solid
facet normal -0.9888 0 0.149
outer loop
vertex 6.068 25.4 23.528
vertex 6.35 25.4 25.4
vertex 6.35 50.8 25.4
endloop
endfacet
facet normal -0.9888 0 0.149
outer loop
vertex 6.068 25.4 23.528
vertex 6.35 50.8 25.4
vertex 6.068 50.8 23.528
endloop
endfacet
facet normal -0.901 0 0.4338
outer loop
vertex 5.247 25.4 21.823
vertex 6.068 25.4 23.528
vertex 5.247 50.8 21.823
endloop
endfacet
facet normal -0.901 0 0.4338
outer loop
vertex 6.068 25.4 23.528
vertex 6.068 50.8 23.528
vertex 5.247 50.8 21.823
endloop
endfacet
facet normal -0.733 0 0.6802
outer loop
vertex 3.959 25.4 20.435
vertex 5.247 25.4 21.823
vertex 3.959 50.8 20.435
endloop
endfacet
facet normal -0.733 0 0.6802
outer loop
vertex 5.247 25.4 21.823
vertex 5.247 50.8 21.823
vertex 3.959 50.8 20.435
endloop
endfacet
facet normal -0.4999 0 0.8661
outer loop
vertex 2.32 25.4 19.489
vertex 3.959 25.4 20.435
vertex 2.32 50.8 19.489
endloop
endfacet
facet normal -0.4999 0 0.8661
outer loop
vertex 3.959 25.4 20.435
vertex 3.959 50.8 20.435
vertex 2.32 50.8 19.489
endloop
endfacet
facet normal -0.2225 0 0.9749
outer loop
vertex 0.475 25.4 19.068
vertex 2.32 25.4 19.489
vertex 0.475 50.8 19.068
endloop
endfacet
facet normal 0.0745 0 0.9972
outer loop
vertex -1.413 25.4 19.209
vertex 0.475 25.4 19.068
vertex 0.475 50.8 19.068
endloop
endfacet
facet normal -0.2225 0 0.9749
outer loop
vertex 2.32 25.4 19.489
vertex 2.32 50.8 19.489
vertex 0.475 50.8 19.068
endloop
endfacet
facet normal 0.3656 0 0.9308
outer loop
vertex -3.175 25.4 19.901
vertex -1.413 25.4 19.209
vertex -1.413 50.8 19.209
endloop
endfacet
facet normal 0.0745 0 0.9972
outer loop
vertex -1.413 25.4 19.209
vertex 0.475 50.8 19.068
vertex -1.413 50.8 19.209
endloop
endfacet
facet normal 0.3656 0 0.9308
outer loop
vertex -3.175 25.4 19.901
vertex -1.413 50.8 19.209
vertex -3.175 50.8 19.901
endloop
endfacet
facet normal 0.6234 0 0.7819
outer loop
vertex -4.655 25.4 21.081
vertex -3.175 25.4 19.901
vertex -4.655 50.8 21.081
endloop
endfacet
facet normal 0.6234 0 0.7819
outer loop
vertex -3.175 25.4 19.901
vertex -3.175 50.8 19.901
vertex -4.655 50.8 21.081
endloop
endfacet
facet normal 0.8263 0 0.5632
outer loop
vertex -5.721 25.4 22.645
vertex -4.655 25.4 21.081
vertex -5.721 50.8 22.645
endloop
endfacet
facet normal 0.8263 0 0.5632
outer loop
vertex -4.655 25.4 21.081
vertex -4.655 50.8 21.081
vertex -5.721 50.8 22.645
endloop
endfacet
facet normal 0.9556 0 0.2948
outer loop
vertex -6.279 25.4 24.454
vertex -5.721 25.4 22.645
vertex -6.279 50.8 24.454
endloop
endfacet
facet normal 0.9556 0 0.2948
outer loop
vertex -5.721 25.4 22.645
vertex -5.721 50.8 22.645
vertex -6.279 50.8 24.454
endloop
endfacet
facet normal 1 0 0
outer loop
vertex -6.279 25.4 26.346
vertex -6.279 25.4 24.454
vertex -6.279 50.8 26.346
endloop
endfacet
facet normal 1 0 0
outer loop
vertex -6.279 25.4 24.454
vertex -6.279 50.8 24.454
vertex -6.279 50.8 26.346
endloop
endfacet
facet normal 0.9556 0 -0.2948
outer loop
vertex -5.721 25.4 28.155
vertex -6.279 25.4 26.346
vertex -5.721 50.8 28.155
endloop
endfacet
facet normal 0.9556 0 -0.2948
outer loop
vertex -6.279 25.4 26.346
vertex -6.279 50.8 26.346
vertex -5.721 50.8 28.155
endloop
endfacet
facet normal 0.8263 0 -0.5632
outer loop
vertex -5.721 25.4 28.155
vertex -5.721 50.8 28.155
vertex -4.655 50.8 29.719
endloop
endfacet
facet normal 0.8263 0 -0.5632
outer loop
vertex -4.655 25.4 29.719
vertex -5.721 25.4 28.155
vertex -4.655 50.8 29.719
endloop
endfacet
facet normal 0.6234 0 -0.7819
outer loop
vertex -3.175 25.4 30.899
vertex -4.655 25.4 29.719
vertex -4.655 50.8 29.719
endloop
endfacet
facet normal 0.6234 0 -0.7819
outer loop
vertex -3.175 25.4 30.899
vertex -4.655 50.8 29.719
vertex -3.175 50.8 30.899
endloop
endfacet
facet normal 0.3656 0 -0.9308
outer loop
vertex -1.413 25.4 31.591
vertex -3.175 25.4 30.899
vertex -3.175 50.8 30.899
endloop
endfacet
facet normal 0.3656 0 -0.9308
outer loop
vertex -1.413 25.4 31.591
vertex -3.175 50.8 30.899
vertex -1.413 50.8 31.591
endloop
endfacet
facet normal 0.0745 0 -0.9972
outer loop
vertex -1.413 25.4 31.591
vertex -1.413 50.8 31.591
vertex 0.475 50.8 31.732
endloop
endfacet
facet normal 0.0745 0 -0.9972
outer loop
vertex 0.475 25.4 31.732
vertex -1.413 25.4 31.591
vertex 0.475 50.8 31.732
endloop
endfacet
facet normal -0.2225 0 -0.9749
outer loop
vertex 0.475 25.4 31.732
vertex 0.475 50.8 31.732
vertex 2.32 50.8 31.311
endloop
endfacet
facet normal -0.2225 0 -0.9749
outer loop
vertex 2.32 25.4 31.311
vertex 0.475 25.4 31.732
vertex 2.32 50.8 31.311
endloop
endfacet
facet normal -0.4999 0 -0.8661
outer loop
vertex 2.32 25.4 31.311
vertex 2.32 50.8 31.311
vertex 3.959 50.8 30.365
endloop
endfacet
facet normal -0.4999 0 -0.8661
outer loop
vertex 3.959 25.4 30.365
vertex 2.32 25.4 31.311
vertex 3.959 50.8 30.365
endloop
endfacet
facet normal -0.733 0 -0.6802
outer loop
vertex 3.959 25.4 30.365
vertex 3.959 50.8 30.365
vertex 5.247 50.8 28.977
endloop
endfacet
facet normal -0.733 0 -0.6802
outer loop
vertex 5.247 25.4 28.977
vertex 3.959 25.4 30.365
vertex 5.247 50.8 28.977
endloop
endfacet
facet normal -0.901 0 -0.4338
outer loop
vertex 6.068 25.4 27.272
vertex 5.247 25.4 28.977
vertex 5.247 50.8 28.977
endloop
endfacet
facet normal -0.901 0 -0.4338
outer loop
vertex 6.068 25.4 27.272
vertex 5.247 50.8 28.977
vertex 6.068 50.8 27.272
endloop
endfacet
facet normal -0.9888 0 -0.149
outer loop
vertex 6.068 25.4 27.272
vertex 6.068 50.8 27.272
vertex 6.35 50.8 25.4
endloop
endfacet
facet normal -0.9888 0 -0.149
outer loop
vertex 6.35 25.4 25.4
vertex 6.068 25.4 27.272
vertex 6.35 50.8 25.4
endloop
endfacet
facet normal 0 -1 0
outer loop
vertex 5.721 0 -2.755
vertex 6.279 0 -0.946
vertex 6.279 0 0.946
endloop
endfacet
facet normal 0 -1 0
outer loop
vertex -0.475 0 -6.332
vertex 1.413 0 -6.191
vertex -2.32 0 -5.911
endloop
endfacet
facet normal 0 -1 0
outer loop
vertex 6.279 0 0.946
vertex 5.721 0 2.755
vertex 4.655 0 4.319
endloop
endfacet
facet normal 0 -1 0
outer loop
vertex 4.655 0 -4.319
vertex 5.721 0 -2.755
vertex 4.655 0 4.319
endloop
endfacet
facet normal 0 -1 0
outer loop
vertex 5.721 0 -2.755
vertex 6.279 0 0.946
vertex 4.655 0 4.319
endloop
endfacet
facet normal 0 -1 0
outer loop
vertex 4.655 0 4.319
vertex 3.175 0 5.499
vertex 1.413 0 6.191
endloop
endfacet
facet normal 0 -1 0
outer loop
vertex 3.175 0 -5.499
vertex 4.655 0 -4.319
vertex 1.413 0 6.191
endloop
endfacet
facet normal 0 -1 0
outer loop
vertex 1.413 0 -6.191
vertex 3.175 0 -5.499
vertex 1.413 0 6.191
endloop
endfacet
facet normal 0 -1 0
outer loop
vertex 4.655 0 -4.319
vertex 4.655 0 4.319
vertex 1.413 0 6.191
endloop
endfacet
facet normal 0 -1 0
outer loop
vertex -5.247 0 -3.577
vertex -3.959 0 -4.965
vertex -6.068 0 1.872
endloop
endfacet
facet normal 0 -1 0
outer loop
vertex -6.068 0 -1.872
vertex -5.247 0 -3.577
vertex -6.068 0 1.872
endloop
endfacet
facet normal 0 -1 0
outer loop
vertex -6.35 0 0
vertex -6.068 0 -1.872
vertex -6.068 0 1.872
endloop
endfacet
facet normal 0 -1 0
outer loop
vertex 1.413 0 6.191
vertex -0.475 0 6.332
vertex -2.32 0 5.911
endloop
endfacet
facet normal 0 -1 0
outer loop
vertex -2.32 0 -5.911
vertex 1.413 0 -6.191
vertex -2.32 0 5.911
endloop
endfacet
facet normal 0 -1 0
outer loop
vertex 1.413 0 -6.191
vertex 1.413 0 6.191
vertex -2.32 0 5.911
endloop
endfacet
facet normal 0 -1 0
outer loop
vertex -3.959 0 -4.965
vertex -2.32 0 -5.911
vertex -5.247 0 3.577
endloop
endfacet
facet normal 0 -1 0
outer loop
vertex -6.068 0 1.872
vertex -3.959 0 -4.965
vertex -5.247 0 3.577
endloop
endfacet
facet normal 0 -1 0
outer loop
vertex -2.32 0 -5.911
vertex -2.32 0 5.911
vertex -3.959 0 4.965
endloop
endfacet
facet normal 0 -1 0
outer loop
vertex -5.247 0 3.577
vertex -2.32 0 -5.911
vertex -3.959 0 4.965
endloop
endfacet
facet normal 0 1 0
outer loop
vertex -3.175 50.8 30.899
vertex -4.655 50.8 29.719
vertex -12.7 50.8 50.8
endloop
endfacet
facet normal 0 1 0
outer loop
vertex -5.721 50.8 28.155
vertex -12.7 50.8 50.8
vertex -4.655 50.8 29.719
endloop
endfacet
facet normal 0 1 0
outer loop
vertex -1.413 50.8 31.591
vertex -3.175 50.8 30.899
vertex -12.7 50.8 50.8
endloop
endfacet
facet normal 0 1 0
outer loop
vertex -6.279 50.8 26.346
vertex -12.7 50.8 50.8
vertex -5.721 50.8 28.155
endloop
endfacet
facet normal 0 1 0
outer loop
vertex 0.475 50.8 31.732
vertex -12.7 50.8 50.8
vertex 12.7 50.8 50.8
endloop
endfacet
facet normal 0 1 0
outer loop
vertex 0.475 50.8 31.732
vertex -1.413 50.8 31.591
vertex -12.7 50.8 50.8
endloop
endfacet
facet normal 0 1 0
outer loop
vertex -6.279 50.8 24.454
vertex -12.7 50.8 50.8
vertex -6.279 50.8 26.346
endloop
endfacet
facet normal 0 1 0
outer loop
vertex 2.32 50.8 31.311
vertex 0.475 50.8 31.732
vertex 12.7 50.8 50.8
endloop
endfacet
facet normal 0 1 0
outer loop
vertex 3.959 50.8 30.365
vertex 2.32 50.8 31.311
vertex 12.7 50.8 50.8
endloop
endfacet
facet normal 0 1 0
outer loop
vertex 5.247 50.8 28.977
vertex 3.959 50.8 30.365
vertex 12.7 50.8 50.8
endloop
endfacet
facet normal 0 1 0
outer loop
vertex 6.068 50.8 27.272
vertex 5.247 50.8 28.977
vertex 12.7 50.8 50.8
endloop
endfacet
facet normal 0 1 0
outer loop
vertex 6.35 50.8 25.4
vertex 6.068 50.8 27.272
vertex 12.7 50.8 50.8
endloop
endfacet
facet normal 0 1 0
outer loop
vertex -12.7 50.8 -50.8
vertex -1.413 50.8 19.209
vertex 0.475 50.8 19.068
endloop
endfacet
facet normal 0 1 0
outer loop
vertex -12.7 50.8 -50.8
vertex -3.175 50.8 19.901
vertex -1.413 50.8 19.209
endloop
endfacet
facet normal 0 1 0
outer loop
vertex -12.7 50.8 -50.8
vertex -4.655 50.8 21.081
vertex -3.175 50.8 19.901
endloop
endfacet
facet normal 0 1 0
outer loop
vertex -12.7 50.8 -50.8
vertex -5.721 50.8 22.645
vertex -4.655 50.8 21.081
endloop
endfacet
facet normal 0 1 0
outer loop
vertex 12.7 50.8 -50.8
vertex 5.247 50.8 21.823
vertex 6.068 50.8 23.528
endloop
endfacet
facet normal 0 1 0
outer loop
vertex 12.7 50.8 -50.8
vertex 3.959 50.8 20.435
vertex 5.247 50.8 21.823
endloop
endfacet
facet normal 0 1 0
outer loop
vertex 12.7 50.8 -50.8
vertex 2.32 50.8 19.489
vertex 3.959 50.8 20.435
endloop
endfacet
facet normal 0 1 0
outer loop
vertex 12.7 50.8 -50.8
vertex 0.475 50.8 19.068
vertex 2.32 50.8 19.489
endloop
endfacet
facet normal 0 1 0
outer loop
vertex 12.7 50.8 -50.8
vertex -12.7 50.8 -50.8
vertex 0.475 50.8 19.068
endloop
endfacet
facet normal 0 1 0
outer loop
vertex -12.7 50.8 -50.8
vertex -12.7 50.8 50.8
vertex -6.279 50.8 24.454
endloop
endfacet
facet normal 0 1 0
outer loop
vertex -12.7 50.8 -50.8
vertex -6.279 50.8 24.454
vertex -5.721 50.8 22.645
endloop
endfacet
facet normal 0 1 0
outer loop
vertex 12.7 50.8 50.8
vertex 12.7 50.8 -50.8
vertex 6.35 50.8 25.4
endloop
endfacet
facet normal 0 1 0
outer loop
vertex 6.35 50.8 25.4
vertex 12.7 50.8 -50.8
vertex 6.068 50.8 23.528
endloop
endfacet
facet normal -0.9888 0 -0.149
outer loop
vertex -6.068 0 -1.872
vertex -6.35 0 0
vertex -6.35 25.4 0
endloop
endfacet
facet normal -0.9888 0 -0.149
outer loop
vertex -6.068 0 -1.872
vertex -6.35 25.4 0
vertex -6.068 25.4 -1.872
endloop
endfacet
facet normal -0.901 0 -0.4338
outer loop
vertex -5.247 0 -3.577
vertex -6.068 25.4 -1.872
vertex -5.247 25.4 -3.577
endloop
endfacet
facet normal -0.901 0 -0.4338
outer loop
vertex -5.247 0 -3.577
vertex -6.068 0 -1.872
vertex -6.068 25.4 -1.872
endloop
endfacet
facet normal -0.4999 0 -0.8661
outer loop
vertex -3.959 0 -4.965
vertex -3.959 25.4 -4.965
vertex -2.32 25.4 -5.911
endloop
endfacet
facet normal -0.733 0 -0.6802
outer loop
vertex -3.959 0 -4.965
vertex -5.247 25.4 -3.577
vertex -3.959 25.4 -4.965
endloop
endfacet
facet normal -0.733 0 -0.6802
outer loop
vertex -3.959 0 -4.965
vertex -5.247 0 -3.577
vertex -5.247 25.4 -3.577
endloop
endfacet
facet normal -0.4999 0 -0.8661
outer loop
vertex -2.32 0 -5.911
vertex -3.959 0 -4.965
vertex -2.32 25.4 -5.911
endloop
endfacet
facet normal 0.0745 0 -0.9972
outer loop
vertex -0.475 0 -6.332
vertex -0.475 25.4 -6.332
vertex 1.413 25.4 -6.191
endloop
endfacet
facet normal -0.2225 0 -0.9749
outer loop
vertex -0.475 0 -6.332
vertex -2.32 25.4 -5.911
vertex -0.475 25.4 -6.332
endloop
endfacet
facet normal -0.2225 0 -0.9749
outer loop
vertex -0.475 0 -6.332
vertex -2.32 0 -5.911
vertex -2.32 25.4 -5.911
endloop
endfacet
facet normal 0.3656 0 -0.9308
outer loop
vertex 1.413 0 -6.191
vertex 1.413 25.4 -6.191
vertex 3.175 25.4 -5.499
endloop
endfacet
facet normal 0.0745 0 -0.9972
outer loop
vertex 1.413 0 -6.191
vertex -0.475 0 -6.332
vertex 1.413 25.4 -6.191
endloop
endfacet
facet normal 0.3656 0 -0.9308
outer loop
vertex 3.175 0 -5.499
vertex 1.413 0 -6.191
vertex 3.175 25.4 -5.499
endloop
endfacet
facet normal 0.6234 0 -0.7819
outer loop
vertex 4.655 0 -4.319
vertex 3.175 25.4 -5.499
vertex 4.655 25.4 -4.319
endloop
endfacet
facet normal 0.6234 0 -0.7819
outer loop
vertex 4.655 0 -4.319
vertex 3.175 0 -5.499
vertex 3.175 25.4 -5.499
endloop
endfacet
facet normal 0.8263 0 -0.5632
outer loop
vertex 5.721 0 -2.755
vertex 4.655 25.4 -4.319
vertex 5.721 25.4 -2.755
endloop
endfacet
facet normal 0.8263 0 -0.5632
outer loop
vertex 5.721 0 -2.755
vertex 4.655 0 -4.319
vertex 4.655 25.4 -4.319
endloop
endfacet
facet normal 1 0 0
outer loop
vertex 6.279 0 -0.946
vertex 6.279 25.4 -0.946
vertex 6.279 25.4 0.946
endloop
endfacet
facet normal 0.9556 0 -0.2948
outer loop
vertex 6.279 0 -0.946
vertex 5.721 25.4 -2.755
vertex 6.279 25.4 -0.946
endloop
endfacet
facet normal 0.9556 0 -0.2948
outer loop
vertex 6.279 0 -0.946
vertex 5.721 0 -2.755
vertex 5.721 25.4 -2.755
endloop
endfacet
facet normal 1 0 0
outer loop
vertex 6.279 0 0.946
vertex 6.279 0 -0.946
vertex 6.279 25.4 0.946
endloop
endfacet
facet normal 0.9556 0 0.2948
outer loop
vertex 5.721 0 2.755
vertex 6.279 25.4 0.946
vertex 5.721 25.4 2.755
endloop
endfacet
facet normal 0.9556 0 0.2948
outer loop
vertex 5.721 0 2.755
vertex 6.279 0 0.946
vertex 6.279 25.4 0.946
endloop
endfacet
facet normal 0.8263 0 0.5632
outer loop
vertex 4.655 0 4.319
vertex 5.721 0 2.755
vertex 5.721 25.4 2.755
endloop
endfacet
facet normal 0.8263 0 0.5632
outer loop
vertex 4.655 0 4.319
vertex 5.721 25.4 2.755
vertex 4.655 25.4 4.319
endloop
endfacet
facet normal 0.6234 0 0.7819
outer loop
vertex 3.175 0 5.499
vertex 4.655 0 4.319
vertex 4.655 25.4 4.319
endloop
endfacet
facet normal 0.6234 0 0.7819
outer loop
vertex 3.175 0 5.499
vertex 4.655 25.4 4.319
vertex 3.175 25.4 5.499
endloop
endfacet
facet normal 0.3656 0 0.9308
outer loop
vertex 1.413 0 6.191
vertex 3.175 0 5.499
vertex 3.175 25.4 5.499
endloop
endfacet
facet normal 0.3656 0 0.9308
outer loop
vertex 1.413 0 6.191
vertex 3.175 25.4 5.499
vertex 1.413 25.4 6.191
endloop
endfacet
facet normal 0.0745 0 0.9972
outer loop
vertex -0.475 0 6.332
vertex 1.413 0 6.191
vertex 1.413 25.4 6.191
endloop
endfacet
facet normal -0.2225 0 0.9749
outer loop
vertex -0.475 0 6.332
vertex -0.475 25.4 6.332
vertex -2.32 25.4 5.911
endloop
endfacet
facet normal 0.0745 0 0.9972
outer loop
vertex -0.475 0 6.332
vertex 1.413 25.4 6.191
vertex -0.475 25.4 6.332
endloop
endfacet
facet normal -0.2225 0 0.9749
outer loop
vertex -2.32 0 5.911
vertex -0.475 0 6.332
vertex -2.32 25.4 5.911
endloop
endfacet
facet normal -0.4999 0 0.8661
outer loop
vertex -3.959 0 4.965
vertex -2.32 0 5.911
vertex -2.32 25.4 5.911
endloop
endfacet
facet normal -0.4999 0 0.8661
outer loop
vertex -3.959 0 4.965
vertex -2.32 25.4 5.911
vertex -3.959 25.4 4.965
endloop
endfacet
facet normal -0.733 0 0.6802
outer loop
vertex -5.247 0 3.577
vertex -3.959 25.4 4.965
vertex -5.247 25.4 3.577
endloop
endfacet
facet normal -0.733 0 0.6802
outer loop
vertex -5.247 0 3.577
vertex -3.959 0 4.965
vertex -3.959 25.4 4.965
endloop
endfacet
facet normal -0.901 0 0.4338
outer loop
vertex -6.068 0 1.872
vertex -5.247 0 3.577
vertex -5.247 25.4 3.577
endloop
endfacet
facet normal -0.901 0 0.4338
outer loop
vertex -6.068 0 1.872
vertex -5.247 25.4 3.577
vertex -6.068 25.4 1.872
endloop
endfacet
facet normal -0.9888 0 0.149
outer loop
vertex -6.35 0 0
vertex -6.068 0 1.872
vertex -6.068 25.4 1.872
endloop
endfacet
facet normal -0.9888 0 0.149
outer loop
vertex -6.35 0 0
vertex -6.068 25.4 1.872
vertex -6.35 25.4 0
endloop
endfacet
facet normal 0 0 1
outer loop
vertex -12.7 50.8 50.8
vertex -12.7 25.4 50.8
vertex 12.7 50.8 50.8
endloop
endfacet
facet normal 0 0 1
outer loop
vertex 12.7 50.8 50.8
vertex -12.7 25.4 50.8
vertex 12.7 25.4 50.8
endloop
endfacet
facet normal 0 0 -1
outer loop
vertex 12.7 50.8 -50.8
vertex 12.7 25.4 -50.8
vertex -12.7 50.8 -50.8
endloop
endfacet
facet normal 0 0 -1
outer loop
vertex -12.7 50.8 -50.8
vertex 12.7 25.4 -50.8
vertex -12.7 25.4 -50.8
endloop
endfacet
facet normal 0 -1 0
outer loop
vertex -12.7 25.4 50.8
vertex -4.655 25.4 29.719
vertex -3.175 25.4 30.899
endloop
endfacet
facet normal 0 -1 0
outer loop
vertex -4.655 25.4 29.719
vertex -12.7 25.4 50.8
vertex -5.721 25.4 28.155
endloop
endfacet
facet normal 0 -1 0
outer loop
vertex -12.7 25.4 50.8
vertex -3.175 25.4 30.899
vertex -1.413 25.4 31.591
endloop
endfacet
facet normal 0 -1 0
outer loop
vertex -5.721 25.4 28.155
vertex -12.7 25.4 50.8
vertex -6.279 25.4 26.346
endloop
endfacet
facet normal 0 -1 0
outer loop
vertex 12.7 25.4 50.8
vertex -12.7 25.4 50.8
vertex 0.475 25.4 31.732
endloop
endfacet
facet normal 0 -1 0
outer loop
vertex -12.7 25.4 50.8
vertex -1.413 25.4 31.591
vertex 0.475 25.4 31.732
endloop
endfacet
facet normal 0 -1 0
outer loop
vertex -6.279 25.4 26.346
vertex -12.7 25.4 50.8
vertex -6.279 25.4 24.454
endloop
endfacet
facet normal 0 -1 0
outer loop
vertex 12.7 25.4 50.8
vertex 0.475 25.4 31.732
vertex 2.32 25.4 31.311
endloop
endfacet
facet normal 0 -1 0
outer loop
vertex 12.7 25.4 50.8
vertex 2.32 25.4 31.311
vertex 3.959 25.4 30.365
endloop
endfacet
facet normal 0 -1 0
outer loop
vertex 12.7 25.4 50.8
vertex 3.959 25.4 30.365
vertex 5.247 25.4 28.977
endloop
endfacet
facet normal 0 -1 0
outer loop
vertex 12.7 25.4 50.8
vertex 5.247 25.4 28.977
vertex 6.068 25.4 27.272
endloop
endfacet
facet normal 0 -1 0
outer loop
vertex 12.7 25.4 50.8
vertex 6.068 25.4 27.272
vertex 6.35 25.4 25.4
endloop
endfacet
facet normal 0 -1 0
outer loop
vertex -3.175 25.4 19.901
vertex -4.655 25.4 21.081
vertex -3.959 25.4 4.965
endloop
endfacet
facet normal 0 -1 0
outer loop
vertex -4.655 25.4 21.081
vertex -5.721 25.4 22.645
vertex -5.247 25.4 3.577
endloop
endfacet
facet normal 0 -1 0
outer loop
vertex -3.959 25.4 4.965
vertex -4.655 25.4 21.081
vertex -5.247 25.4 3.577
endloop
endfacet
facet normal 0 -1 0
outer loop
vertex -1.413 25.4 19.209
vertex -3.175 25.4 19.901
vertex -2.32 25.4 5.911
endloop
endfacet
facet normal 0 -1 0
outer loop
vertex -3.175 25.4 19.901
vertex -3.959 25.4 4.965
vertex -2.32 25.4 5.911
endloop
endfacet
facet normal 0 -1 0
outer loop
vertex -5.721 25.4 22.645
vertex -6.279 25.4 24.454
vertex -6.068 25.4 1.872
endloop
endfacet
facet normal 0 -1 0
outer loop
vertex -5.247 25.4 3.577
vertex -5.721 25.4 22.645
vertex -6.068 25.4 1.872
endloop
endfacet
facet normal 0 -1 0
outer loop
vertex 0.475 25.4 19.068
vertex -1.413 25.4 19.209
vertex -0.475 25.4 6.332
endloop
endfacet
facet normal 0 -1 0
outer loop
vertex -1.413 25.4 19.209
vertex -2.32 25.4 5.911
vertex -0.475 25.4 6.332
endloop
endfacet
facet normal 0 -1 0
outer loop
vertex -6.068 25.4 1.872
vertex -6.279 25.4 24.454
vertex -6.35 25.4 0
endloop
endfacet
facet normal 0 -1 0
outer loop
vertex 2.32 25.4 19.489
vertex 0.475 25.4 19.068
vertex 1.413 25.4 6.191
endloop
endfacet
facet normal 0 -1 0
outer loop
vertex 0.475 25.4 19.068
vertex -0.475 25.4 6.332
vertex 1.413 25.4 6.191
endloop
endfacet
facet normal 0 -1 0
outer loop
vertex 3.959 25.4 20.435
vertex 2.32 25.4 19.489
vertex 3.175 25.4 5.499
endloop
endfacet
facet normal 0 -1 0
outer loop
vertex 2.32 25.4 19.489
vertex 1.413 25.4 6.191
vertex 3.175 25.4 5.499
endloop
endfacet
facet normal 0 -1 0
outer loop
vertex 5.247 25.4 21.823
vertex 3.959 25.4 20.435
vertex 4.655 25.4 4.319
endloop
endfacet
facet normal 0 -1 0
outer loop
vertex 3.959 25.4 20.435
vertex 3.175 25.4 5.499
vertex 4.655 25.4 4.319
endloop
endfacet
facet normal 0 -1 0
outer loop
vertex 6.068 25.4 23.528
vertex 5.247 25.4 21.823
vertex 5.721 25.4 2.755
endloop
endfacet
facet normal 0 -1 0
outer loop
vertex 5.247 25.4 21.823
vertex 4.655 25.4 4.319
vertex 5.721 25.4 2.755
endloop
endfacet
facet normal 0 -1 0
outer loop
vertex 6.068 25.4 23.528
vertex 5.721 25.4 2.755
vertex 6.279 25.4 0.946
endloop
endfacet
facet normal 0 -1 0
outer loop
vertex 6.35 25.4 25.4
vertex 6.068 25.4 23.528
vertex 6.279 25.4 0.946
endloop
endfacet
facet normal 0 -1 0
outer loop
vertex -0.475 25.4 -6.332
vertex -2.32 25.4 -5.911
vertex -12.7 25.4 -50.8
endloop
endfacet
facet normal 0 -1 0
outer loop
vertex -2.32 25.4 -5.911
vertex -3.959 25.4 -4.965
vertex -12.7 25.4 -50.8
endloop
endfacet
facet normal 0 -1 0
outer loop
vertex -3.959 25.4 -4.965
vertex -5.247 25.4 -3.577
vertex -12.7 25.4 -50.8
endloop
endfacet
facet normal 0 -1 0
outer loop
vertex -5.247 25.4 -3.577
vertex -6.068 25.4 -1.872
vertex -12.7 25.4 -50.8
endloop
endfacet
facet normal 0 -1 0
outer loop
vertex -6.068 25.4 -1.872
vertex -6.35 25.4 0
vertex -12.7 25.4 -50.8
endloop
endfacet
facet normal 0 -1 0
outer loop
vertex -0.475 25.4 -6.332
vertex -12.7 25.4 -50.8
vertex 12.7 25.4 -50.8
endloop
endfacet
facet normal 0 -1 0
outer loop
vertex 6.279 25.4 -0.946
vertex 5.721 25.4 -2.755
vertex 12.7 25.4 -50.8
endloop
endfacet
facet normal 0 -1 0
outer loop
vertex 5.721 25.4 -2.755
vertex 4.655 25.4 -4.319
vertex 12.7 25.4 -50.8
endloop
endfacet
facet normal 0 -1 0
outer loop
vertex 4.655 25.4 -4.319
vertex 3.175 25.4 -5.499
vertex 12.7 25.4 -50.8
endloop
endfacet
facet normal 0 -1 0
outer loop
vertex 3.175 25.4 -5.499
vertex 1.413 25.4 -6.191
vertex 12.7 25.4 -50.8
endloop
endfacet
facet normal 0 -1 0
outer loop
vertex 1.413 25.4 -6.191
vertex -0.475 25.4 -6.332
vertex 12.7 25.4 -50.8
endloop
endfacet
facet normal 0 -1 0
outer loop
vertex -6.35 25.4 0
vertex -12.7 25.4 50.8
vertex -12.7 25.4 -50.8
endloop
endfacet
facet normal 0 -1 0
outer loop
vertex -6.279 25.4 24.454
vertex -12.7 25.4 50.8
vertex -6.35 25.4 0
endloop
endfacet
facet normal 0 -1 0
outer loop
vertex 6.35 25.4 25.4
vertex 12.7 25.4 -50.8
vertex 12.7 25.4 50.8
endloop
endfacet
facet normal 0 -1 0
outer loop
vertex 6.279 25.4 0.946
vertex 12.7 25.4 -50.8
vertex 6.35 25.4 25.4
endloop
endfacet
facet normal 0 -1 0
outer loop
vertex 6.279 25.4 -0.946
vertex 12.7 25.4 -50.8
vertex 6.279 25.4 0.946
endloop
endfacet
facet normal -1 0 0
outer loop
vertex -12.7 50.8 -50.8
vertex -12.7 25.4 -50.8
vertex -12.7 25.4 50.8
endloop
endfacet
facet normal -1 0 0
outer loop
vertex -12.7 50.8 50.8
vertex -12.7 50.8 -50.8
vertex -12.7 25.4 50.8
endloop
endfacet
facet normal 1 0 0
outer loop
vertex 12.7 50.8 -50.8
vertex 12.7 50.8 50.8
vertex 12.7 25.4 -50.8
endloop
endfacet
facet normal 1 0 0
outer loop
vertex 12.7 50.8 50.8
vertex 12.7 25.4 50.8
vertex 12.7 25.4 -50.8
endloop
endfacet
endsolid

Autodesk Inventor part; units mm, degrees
ref_plane "YZ Plane" through (0, 0, 0) normal (1, 0, 0) x (0, 1, 0)
ref_plane "XZ Plane" through (0, 0, 0) normal (0, 1, 0) x (-1, 0, 0)
ref_plane "XY Plane" through (0, 0, 0) normal (0, 0, 1) x (1, 0, 0)
sketch "Sketch1" plane through (0, 0, 0) normal (0, 1, 0) x (-1, 0, 0)
  circle A0 centre (0, 0) radius 6.35
  dimension "d0" = 12.7
extrude "Extrusion1" add sketch "Sketch1" along normal blind 25.4
sketch "Sketch2" plane through (0, 25.4, 0) normal (0, 1, 0) x (1, 0, 0)
  line L0 (12.7, 50.8) -> (-12.7, 50.8)
  line L1 (-12.7, 50.8) -> (-12.7, -50.8)
  line L2 (-12.7, -50.8) -> (12.7, -50.8)
  line L3 (12.7, -50.8) -> (12.7, 50.8)
  line L4 (12.7, 50.8) -> (-12.7, -50.8) construction
  line L5 (-12.7, 50.8) -> (12.7, -50.8) construction
  point P0 (0, 0)
  dimension "d3" = 101.6
  dimension "d4" = 25.4
extrude "Extrusion2" add sketch "Sketch2" along normal blind 25.4
sketch "Sketch3" plane through (0, 50.8, 0) normal (0, 1, 0) x (1, 0, 0)
  circle A0 centre (0, -25.4) radius 6.35
  line L0 (-12.7, -50.8) -> (12.7, -50.8) projected
  point P0 (0, 0)
  dimension "d7" = 25.4
  dimension "d8" = 12.7
extrude "Extrusion3" cut sketch "Sketch3" against normal through all
properties part number "knuckle"
